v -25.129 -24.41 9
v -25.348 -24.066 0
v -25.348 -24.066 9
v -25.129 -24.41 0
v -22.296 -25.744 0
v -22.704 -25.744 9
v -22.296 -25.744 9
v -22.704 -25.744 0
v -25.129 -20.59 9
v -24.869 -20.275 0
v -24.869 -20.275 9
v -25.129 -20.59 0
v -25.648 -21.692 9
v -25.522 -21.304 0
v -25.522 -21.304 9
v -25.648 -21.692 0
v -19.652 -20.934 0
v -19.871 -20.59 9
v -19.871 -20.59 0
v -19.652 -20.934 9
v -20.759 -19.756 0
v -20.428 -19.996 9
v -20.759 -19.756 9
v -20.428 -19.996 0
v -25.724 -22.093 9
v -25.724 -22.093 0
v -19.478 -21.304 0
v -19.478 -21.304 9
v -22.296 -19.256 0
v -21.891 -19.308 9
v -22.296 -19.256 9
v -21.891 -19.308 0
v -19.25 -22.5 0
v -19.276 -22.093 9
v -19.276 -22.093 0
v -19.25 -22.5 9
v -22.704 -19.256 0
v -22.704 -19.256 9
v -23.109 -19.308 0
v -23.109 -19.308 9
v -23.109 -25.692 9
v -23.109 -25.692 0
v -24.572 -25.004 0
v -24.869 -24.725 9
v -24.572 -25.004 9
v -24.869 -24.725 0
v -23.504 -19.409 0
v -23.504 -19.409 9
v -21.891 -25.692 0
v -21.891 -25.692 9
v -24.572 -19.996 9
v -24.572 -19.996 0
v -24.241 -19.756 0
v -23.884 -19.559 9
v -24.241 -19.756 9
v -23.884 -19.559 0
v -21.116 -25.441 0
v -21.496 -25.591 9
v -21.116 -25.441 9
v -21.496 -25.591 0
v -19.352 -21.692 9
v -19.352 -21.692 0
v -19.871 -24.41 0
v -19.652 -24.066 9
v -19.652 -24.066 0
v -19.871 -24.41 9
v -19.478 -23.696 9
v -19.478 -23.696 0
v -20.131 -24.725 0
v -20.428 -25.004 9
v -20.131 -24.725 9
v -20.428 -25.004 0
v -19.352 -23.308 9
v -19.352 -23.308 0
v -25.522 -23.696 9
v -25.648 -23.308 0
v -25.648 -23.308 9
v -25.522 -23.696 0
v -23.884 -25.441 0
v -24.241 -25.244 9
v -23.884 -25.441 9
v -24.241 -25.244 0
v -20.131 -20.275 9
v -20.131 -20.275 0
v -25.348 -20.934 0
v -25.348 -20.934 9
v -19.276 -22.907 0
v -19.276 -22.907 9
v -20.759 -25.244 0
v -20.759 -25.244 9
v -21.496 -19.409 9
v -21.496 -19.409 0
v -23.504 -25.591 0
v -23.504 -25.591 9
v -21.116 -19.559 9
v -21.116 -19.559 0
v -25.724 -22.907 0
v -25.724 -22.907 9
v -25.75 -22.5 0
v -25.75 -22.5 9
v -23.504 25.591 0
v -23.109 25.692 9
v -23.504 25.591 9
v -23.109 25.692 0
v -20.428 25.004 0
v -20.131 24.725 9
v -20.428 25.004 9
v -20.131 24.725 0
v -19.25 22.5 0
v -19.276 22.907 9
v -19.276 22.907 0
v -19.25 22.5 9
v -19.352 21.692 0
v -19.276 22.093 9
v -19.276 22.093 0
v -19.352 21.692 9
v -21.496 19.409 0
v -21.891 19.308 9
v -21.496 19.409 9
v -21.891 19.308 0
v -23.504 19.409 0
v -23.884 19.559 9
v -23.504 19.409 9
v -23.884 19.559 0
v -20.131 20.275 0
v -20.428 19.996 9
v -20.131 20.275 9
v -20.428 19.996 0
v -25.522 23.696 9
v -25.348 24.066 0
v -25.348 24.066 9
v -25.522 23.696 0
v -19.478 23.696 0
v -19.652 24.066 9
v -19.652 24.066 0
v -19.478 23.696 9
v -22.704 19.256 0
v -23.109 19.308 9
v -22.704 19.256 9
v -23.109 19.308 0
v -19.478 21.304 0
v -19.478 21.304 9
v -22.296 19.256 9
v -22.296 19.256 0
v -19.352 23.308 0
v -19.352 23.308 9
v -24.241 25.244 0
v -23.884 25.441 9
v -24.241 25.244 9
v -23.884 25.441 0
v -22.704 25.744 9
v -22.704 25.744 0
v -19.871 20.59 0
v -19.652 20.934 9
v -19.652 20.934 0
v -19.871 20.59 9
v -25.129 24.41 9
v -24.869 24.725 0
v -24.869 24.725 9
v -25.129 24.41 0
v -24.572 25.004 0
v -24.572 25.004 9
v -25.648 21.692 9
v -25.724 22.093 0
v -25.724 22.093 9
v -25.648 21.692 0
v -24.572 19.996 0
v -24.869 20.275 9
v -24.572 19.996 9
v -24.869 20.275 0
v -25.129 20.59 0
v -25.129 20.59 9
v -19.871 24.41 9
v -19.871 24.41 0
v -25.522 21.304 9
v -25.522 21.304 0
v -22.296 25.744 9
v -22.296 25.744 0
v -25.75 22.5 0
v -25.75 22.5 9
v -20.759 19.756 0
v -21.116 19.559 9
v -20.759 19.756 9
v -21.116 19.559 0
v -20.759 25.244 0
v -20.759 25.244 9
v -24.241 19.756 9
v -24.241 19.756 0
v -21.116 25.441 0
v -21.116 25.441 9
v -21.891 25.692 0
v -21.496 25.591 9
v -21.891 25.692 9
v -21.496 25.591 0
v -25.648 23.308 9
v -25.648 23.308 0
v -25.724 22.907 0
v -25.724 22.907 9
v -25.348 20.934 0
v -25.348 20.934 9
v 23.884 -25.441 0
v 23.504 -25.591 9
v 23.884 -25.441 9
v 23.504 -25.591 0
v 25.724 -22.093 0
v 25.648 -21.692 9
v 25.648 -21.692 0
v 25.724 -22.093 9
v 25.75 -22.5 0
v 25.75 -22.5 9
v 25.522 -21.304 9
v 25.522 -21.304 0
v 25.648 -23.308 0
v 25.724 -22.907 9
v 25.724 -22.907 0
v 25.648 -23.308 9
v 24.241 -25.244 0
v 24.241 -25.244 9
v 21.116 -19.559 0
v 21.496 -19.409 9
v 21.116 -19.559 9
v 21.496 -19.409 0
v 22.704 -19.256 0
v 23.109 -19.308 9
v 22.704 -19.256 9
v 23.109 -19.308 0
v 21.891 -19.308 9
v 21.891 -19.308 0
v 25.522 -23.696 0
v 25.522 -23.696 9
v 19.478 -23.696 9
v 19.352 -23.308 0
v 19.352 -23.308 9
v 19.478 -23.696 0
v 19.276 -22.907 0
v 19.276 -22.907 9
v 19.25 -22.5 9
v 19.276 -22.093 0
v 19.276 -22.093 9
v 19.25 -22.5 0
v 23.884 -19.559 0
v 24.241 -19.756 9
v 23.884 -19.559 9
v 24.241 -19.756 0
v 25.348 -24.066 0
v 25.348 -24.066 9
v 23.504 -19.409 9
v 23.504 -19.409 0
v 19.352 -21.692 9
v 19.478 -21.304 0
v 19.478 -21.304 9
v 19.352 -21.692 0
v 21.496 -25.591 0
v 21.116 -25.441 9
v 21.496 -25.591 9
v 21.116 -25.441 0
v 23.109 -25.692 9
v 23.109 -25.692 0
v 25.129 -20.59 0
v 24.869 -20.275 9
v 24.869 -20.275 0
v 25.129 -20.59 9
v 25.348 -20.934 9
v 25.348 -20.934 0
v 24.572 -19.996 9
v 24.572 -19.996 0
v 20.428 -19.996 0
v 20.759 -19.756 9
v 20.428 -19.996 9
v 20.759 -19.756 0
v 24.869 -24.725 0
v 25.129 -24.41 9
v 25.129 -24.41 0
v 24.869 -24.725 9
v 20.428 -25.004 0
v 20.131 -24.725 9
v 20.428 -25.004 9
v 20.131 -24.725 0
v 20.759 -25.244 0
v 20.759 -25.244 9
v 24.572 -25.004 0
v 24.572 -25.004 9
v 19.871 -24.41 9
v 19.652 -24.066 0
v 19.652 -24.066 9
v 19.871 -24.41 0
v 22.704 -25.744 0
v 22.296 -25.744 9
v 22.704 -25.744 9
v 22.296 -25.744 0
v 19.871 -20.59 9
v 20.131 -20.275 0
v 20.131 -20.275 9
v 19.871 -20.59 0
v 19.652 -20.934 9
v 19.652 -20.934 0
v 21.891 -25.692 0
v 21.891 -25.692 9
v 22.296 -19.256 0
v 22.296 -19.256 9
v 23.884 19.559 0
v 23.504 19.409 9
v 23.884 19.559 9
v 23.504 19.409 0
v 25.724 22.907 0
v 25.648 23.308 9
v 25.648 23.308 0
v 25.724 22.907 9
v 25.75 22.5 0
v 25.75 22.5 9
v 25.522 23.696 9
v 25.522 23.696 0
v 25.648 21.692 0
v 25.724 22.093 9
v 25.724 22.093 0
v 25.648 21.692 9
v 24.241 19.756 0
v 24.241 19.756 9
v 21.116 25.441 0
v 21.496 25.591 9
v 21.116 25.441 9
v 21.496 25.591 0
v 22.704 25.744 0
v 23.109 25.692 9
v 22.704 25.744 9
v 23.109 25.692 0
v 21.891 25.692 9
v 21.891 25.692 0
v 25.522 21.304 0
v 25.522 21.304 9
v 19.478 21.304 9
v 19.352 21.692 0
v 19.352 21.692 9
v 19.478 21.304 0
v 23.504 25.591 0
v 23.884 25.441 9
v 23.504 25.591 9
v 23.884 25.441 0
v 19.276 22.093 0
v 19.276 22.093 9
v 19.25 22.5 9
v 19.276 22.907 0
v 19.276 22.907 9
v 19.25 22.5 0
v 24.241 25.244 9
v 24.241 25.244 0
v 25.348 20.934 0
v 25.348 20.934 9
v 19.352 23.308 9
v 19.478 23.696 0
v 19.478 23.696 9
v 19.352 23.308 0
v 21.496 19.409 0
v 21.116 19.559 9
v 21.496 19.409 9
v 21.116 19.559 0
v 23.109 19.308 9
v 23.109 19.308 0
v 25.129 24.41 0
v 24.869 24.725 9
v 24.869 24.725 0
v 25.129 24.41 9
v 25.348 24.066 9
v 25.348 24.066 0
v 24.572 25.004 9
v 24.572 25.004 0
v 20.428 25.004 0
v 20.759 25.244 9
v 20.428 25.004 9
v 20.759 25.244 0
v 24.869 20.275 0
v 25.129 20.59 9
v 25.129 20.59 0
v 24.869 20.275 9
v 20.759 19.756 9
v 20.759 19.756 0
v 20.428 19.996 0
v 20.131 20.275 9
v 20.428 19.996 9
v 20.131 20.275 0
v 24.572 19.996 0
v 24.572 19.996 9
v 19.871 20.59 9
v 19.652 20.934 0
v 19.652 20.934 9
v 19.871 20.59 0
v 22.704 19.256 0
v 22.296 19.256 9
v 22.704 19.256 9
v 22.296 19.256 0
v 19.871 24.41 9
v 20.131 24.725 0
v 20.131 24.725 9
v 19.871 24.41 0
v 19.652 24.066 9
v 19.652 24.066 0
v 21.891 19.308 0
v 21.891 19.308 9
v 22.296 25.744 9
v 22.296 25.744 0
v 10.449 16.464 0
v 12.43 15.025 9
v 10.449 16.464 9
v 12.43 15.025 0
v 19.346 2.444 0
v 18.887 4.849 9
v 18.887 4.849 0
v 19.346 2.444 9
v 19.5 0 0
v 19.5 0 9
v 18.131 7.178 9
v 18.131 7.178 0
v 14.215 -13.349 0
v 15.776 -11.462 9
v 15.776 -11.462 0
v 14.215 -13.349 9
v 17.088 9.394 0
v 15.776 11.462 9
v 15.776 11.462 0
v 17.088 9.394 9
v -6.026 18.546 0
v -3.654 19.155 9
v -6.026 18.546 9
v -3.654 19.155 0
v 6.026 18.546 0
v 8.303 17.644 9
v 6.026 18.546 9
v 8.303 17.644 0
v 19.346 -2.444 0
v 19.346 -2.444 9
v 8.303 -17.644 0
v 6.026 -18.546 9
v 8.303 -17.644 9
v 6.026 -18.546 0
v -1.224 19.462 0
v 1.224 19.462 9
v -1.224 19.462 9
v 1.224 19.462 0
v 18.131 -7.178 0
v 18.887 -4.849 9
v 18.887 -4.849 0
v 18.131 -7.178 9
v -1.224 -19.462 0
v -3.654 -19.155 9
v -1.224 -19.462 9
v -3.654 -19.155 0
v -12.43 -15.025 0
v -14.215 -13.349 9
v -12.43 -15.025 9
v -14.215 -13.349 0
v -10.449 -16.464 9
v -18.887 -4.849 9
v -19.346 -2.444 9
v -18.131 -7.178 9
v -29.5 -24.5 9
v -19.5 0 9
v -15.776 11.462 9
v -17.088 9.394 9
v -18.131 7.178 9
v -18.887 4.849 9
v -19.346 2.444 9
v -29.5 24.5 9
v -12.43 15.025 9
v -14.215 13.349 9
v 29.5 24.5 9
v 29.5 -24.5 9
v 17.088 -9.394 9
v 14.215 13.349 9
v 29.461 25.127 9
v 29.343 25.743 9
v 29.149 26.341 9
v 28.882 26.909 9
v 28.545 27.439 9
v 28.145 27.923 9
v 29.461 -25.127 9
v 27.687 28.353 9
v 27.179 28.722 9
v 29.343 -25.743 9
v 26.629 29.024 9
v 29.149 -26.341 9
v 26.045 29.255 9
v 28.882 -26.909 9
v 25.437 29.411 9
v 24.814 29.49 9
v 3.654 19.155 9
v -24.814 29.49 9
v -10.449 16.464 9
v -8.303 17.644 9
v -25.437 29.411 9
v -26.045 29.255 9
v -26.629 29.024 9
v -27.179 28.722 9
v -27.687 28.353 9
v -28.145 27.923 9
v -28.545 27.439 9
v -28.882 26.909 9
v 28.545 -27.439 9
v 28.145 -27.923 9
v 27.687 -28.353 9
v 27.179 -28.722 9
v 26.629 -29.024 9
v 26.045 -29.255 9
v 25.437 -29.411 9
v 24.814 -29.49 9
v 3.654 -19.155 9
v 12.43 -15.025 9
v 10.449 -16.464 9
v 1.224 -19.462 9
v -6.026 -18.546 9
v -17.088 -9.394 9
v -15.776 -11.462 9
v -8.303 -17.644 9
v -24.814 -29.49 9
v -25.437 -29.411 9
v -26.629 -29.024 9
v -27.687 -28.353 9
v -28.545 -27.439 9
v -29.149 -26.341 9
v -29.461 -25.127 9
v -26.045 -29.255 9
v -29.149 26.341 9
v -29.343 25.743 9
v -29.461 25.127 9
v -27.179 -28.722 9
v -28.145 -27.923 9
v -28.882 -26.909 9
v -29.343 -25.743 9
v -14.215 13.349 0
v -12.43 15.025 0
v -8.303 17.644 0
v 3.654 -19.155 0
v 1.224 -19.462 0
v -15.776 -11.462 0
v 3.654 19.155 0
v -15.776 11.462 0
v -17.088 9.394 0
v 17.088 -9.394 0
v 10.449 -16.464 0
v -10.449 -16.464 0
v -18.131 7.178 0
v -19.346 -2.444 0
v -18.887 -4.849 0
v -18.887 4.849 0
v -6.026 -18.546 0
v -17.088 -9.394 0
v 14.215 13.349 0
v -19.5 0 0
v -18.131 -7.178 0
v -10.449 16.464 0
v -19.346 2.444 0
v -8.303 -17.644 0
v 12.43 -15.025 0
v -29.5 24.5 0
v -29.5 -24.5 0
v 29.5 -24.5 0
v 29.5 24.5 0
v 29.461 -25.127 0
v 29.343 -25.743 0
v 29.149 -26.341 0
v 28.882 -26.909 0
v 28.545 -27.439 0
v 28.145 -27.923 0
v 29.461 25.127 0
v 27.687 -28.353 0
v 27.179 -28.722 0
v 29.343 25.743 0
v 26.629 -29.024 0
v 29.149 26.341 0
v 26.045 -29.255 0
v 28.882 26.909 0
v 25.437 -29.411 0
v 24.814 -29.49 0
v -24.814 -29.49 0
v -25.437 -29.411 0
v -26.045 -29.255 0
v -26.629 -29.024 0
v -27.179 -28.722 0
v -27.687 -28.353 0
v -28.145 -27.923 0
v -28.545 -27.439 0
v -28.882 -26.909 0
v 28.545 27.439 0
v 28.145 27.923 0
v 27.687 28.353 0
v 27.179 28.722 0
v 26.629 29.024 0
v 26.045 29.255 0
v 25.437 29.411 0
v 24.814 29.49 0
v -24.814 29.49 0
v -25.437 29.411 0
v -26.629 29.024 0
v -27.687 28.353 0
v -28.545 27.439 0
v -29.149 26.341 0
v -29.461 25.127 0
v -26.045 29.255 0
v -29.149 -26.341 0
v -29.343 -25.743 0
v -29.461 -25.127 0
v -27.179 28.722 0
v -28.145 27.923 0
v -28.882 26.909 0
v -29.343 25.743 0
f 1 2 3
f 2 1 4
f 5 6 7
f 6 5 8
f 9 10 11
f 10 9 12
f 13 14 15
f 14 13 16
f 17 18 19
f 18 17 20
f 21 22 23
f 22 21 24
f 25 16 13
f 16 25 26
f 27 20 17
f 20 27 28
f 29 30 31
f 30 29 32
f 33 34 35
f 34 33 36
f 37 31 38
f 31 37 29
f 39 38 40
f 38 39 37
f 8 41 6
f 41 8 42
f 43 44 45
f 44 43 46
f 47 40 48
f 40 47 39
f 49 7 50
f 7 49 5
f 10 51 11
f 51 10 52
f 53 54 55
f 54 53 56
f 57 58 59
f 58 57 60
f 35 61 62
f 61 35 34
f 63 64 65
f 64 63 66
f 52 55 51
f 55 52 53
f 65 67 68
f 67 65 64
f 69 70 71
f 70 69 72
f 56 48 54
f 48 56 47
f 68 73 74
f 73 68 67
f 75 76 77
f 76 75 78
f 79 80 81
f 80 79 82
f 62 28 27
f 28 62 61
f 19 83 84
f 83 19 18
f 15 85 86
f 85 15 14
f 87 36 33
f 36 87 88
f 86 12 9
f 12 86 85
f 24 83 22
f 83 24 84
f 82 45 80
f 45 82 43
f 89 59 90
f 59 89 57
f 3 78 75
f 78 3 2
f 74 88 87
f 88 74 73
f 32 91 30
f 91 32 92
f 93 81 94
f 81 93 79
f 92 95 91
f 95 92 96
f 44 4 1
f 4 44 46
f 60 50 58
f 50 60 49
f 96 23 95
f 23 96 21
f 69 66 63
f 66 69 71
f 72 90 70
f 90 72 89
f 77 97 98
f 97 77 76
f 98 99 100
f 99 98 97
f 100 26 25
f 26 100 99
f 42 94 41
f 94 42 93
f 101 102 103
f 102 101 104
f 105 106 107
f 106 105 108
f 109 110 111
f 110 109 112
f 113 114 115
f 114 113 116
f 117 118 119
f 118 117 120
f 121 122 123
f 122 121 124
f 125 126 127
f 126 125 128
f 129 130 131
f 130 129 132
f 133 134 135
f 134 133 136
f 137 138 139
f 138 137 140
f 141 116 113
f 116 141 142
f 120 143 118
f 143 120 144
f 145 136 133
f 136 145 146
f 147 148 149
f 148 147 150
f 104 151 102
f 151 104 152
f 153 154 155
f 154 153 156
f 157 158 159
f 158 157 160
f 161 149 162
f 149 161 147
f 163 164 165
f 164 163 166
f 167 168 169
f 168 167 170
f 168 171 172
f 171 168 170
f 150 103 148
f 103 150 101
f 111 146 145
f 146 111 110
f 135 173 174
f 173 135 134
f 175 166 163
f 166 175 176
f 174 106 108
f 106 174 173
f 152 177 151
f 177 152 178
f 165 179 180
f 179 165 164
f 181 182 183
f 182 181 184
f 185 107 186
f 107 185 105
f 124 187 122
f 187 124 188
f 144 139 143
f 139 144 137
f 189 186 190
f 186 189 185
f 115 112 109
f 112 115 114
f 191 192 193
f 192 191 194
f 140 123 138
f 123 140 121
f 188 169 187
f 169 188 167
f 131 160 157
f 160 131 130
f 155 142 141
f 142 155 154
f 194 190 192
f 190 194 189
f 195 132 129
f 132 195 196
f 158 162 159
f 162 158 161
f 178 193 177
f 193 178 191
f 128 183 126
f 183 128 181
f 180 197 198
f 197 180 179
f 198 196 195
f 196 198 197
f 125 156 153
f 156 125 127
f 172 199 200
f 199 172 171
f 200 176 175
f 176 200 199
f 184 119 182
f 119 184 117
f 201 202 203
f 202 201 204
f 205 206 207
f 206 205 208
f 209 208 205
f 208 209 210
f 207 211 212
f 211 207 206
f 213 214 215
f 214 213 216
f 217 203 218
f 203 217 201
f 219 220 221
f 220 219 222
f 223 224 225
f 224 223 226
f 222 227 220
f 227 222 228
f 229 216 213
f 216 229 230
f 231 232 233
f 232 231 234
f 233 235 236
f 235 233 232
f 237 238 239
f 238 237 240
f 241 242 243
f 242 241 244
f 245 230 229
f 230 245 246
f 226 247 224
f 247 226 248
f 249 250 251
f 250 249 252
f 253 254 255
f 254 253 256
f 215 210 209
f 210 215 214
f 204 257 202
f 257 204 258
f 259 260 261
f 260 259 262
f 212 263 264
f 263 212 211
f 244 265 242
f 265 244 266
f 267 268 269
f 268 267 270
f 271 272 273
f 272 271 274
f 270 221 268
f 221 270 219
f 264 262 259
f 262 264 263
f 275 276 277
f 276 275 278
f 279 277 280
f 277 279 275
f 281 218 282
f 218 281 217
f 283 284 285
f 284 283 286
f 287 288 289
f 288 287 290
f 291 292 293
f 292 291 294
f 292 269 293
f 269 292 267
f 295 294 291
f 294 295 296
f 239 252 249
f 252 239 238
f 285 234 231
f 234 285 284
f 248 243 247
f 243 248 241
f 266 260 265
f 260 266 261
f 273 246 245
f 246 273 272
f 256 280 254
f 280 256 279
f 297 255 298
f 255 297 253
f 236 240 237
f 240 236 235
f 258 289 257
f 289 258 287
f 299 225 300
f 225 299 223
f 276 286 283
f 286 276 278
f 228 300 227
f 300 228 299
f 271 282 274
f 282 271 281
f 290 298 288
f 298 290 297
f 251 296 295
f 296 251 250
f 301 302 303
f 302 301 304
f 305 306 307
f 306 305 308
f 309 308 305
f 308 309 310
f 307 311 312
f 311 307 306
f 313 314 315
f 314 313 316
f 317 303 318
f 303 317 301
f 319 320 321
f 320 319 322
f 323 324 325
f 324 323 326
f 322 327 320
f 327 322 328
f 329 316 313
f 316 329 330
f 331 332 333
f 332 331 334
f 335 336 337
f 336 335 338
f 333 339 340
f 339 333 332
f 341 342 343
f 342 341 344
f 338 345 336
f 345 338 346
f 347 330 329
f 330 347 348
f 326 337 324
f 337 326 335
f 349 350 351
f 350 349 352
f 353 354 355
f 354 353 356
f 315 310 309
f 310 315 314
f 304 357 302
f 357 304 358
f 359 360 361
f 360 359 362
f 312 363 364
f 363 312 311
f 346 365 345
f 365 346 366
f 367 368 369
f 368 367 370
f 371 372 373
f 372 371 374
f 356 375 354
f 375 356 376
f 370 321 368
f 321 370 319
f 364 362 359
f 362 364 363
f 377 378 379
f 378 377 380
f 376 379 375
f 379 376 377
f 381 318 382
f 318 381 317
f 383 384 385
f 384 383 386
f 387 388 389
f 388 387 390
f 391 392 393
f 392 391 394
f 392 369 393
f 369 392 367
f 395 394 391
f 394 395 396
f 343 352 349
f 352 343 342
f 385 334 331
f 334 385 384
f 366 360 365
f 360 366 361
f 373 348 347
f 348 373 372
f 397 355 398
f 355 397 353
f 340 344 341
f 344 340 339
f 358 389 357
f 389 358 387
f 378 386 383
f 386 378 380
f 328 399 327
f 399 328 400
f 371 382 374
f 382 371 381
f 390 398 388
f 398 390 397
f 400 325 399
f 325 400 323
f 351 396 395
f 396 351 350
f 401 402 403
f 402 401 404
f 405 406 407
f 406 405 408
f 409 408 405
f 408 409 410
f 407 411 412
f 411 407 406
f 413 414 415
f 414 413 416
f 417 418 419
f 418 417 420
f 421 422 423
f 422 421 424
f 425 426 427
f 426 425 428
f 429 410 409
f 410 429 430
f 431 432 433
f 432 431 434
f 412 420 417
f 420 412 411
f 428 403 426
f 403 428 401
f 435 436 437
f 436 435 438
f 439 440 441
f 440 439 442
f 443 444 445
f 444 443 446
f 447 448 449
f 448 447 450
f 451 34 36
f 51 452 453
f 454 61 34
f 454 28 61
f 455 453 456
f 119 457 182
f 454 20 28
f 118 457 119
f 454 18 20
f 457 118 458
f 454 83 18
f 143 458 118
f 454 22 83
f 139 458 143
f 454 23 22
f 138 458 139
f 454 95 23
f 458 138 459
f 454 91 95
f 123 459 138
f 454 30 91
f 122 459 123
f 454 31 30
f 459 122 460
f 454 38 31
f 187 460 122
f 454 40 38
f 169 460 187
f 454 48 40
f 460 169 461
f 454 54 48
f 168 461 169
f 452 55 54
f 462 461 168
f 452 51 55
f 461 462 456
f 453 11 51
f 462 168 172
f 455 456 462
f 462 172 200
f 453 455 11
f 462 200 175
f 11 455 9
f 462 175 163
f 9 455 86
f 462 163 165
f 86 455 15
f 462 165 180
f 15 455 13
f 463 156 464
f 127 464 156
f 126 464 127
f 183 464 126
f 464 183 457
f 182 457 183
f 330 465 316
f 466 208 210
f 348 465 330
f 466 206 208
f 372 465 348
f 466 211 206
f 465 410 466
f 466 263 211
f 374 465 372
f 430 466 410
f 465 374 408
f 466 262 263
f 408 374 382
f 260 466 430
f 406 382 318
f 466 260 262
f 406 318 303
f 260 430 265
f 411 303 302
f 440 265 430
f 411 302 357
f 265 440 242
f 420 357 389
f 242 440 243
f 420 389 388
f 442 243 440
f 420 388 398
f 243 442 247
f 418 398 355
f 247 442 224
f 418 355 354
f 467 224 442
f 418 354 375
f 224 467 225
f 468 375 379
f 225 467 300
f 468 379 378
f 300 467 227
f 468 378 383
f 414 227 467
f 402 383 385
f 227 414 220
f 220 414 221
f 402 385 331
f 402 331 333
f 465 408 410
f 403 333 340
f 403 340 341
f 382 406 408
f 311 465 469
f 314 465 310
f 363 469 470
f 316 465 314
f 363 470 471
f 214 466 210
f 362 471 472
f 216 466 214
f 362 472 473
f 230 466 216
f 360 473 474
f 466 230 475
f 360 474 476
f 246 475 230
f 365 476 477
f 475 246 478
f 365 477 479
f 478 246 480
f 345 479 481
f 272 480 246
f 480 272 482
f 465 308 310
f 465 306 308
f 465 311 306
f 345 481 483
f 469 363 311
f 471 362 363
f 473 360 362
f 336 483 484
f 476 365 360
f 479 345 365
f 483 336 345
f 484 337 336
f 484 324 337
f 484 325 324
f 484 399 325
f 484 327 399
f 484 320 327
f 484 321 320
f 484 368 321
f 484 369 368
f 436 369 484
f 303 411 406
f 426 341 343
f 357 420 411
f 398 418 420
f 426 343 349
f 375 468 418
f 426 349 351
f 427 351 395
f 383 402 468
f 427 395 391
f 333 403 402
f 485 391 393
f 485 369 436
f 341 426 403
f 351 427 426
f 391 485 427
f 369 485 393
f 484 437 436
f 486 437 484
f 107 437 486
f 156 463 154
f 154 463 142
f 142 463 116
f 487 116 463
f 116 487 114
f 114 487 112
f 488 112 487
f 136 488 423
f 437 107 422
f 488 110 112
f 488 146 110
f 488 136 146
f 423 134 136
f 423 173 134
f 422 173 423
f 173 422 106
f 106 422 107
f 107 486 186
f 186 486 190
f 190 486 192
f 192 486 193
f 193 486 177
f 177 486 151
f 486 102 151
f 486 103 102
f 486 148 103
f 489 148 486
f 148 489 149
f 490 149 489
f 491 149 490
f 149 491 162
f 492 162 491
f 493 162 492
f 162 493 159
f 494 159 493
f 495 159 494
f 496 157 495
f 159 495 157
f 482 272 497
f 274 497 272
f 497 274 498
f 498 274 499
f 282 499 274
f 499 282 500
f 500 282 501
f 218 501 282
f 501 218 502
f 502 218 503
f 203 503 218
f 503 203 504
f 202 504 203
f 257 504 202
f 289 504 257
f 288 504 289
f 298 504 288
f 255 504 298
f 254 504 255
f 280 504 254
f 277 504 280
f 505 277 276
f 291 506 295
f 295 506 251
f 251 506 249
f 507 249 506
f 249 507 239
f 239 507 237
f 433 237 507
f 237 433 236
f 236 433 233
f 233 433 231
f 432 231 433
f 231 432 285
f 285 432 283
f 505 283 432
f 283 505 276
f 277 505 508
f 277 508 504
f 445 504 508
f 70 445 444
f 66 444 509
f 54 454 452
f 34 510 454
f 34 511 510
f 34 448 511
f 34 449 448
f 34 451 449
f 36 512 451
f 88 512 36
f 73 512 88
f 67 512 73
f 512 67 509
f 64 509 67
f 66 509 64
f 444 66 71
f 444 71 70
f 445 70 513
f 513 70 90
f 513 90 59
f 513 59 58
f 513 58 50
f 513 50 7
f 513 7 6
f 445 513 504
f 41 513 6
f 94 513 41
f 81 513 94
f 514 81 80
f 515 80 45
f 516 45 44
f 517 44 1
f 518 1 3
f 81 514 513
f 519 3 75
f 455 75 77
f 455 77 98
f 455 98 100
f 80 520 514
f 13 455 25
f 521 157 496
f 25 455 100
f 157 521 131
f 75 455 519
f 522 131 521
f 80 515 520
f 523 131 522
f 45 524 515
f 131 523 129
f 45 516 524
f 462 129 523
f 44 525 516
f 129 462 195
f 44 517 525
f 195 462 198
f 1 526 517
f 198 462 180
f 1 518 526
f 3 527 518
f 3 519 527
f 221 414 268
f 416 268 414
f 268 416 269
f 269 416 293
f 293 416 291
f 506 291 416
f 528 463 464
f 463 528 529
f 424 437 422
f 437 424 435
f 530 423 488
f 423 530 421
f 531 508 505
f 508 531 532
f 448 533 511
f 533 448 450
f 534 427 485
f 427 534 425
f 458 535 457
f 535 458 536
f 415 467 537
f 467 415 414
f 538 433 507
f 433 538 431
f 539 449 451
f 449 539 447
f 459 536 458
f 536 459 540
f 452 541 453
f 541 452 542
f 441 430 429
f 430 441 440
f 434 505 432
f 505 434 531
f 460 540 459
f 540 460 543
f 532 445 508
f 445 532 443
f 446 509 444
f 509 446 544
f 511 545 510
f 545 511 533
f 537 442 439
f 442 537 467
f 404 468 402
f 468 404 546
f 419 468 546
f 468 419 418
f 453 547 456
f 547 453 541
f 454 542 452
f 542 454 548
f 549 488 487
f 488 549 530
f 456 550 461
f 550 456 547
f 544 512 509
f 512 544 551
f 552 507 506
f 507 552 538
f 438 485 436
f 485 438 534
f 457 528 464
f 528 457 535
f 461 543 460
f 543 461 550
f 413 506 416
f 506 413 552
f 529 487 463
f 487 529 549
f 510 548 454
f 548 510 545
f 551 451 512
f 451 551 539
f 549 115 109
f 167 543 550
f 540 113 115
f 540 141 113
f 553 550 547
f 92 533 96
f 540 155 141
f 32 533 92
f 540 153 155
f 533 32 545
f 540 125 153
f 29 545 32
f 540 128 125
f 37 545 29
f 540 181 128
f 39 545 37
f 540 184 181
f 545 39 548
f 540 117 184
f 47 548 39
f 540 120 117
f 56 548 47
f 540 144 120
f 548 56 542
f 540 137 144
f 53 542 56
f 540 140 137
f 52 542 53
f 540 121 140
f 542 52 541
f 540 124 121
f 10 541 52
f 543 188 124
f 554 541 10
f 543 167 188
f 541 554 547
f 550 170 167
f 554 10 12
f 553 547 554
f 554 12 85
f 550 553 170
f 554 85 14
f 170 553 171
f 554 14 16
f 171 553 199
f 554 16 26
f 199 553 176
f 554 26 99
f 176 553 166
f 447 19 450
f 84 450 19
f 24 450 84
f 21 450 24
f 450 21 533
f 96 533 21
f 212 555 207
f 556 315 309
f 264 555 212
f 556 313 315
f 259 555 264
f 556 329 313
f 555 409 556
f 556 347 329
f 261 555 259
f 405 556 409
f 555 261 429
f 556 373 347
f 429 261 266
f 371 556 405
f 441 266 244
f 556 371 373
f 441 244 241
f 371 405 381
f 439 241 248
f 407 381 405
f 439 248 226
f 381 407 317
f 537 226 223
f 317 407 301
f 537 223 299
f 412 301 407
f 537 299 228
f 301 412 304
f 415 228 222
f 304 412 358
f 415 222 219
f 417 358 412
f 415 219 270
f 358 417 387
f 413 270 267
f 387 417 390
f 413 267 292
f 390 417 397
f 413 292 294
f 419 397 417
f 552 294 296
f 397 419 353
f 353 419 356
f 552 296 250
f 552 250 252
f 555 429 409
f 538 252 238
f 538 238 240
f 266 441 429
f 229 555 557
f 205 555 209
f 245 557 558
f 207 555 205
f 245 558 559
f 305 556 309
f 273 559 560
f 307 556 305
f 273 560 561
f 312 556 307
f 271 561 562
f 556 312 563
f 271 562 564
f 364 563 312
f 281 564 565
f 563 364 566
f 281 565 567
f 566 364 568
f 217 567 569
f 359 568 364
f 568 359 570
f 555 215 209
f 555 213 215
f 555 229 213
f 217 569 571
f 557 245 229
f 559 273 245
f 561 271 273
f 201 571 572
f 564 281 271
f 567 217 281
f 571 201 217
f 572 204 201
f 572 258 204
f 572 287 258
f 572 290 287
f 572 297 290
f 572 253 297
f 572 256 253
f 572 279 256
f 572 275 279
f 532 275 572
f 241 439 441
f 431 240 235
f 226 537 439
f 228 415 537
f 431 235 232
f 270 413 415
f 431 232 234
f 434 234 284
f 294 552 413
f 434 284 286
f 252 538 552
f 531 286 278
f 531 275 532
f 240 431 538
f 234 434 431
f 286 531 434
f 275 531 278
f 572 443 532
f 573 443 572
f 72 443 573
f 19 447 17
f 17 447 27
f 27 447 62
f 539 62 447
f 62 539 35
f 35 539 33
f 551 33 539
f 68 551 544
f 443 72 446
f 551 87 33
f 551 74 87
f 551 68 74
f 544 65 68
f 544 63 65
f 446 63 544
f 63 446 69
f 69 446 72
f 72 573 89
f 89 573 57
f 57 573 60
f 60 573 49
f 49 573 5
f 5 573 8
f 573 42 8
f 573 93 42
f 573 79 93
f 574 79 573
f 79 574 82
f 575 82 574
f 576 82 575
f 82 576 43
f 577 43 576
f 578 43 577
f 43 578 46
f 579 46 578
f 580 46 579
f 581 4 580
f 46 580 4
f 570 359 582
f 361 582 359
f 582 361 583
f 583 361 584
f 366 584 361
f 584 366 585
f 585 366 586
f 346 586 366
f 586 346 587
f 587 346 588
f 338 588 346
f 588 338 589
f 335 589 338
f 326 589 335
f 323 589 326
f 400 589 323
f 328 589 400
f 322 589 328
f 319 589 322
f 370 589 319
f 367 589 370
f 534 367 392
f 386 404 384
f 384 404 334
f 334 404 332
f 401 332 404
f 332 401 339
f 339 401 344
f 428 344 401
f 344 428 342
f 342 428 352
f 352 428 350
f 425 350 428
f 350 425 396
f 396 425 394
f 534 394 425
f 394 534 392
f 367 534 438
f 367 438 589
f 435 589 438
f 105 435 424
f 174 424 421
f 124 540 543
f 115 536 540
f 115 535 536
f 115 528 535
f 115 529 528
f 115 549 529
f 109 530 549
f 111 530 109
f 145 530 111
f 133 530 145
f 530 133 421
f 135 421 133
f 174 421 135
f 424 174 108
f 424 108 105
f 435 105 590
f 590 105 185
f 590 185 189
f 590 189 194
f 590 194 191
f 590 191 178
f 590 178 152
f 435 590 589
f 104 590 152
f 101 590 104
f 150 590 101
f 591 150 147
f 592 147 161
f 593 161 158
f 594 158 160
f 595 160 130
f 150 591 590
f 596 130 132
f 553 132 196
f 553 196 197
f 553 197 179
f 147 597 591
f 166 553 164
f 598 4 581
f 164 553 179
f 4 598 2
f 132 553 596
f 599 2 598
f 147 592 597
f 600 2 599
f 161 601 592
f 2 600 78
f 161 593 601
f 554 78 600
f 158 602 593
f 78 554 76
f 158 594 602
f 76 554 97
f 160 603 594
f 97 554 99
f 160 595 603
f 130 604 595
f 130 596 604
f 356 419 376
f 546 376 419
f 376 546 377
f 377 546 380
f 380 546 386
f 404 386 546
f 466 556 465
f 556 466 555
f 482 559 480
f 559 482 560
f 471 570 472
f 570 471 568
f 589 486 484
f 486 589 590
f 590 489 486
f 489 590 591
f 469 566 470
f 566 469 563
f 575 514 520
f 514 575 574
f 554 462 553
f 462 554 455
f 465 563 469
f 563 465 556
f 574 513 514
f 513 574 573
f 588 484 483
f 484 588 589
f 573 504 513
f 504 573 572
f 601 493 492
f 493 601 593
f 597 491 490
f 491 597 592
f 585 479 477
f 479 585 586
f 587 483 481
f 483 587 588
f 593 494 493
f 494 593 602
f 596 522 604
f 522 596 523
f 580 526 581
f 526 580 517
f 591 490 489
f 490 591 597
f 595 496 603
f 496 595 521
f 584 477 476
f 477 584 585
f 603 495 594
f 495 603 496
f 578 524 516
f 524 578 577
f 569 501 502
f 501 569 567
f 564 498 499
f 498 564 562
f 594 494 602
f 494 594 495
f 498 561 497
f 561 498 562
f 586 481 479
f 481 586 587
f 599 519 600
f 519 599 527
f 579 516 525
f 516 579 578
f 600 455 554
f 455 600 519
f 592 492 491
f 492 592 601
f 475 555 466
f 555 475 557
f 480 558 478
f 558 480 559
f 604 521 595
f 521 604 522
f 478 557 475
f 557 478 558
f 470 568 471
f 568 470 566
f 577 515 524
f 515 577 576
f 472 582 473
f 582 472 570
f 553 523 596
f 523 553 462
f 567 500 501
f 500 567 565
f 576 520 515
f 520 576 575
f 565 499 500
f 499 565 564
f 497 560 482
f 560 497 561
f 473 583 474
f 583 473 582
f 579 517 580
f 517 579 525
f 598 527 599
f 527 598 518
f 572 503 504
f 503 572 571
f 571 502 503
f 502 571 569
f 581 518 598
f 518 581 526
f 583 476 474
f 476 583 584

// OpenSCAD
$fn = 50;


difference() {
	union() {
		hull() {
			translate(v = [-24.5000000000, 24.5000000000, 0]) {
				cylinder(h = 9, r = 5);
			}
			translate(v = [24.5000000000, 24.5000000000, 0]) {
				cylinder(h = 9, r = 5);
			}
			translate(v = [-24.5000000000, -24.5000000000, 0]) {
				cylinder(h = 9, r = 5);
			}
			translate(v = [24.5000000000, -24.5000000000, 0]) {
				cylinder(h = 9, r = 5);
			}
		}
	}
	union() {
		#translate(v = [-22.5000000000, -22.5000000000, -100.0000000000]) {
			cylinder(h = 200, r = 3.2500000000);
		}
		#translate(v = [-22.5000000000, 22.5000000000, -100.0000000000]) {
			cylinder(h = 200, r = 3.2500000000);
		}
		#translate(v = [22.5000000000, -22.5000000000, -100.0000000000]) {
			cylinder(h = 200, r = 3.2500000000);
		}
		#translate(v = [22.5000000000, 22.5000000000, -100.0000000000]) {
			cylinder(h = 200, r = 3.2500000000);
		}
		#cylinder(h = 9, r = 19.5000000000);
	}
}
